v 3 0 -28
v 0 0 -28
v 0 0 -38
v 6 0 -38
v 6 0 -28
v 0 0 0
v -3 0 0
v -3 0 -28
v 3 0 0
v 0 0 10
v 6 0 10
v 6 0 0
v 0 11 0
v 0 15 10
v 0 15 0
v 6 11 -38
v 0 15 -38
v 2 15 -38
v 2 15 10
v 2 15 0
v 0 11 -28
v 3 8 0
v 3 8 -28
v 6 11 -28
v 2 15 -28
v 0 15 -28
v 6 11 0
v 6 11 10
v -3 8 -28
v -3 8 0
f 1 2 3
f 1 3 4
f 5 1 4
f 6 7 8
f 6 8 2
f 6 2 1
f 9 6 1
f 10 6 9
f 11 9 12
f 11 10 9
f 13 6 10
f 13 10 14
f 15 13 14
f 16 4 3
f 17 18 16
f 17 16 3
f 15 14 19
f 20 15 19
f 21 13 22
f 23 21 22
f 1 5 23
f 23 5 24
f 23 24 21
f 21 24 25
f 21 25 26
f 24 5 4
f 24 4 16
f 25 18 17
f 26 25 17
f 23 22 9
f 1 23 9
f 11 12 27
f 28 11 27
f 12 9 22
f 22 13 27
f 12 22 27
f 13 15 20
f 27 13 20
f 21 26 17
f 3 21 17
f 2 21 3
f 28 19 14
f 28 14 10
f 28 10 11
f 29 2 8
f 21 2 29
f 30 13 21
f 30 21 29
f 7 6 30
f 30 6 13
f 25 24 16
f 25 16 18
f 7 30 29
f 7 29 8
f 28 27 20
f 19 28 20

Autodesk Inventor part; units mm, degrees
ref_plane "YZ Plane" through (0, 0, 0) normal (1, 0, 0) x (0, 1, 0)
ref_plane "XZ Plane" through (0, 0, 0) normal (0, 1, 0) x (-1, 0, 0)
ref_plane "XY Plane" through (0, 0, 0) normal (0, 0, 1) x (1, 0, 0)
sketch "Sketch1" plane through (0, 0, 0) normal (0, 0, 1) x (1, 0, 0)
  line L0 (0, 0) -> (0, 15)
  line L1 (0, 15) -> (2, 15)
  line L2 (0, 0) -> (6, 0)
  line L3 (6, 0) -> (6, 11)
  line L4 (6, 11) -> (2, 15)
  dimension "d0" = 15
  dimension "d1" = 2
  dimension "d2" = 6
  dimension "d3" = 11
extrude "Extrusion1" add sketch "Sketch1" along normal blind 10
sketch "Sketch2" plane through (0, 0, 0) normal (0, 0, -1) x (-1, 0, 0)
  line L0 (0, 15) -> (0, 0) projected
  line L1 (0, 0) -> (-3, 0)
  line L2 (0, 0) -> (-6, 0) projected
  line L3 (-6, 11) -> (-2, 15) projected
  line L4 (0, 0) -> (3, 0)
  line L5 (0, 11) -> (-3, 8)
  line L6 (0, 11) -> (3, 8)
  line L7 (-3, 8) -> (-3, 0)
  line L8 (3, 8) -> (3, 0)
extrude "Extrusion2" add sketch "Sketch2" along normal blind 28
sketch "Sketch3" plane through (0, 0, -28) normal (0, 0, -1) x (-1, 0, 0)
  line L0 (0, 15) -> (0, 0) projected
  line L1 (0, 0) -> (-6, 0) projected
  line L2 (0, 0) -> (-6, 0)
  line L3 (-6, 0) -> (-6, 11) projected
  line L4 (-6, 0) -> (-6, 11)
  line L5 (-6, 11) -> (-2, 15) projected
  line L6 (-6, 11) -> (-2, 15)
  line L7 (-2, 15) -> (0, 15) projected
  line L8 (-2, 15) -> (0, 15)
  line L9 (0, 15) -> (0, 0)
extrude "Extrusion3" add sketch "Sketch3" along normal blind 10
properties part number "inside-join"
